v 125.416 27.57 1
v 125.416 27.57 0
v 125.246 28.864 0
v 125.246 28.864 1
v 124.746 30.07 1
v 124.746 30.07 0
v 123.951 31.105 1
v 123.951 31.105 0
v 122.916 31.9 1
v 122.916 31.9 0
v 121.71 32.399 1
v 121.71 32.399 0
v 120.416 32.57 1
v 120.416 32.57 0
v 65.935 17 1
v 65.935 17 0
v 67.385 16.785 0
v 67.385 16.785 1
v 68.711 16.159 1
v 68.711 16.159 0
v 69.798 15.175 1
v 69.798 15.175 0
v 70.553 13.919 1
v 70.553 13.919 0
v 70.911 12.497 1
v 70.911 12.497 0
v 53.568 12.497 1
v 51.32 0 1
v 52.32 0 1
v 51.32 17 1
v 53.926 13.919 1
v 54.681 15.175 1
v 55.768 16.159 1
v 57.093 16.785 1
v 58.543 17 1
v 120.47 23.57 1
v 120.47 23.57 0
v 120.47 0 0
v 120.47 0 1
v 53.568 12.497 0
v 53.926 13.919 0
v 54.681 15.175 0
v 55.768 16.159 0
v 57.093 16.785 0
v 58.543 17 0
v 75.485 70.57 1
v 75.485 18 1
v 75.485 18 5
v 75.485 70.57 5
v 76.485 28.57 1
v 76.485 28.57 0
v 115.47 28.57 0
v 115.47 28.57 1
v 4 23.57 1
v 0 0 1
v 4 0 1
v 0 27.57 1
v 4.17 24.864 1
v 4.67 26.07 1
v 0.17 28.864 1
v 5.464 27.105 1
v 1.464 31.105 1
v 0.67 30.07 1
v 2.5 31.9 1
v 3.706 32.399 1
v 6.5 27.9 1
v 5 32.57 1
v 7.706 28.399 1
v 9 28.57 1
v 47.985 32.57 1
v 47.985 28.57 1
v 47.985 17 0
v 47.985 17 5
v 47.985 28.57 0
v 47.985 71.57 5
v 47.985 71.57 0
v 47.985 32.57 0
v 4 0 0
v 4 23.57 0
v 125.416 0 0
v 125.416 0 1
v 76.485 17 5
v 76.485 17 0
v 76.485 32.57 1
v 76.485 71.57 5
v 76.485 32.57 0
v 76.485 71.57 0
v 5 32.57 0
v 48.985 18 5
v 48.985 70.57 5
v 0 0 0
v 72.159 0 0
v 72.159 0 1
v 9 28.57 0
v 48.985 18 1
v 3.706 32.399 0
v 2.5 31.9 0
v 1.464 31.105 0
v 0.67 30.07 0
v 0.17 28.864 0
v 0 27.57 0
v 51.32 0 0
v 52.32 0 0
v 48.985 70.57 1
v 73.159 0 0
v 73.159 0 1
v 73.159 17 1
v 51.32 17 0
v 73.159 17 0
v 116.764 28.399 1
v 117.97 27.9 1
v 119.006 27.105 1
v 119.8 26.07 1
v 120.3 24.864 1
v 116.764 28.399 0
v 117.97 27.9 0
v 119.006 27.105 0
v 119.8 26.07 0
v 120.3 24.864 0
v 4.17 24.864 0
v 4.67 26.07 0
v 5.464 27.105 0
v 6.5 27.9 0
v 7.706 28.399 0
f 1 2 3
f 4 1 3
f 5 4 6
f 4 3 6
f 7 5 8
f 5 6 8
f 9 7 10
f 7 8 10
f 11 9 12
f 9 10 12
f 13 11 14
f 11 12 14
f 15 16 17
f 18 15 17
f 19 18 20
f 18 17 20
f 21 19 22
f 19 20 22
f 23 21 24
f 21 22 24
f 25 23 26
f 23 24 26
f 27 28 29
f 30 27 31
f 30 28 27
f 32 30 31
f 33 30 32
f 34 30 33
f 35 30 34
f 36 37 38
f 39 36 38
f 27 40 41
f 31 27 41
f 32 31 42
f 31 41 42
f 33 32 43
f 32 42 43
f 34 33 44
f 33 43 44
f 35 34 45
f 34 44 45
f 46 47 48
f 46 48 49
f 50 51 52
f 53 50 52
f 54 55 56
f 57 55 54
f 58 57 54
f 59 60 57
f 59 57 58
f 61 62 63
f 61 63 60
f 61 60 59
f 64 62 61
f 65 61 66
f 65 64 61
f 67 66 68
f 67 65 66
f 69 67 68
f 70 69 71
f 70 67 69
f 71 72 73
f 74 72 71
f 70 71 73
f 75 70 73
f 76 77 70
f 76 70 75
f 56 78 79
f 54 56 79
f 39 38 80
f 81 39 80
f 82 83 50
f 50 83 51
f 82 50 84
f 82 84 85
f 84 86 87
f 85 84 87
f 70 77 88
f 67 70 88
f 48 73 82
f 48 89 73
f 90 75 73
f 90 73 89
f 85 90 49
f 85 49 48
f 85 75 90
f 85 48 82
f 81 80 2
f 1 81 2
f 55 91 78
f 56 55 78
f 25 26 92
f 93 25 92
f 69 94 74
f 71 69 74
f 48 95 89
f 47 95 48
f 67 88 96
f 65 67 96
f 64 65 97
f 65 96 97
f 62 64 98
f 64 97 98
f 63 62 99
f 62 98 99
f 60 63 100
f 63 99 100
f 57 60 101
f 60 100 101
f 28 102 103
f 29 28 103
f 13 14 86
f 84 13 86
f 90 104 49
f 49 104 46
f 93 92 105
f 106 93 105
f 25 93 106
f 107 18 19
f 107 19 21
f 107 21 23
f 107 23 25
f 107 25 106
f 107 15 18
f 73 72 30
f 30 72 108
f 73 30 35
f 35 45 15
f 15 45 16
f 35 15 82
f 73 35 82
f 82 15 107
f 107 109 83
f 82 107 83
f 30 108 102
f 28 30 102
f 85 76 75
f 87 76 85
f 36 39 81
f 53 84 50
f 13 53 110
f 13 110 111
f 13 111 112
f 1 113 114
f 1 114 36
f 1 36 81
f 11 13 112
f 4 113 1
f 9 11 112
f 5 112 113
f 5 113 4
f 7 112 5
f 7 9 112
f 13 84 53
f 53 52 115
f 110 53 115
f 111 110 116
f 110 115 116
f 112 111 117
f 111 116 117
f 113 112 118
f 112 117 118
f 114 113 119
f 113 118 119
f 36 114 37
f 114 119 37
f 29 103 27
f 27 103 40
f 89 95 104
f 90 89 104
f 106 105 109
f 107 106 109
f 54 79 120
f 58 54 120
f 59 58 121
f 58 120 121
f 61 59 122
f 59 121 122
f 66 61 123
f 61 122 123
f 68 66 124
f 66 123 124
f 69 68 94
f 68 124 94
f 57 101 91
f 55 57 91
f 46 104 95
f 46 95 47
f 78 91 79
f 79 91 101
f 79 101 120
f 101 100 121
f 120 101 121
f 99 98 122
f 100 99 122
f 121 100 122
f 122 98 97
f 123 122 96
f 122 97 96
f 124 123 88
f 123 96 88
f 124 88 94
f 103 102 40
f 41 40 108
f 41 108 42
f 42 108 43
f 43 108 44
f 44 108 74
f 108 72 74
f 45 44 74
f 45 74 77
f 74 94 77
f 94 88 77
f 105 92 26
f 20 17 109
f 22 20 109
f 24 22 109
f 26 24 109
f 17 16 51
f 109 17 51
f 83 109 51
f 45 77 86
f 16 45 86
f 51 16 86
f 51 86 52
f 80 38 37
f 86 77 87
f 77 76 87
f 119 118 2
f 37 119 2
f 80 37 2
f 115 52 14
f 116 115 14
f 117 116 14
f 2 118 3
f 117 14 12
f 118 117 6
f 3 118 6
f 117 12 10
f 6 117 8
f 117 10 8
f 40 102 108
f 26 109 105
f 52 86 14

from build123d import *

# Parameters (mm, degrees)
BOSS_EXTRU_1_DEPTH = 1
ESQUISSE2_W        = 28.5
ESQUISSE2_H        = 54.569597512
ESQUISSE2_W_2      = 26.5
ESQUISSE2_H_2      = 52.569597512
BOSS_EXTRU_2_DEPTH = 4


with BuildPart() as part:
    # Esquisse1 → Boss.-Extru.1 (new body)
    with BuildSketch(Plane.XY):
        with BuildLine():
            Line((0, 27.569597512), (0, 0))
            Line((0, 0), (4, 0))
            Line((4, 0), (4, 23.569597512))
            ThreePointArc((4, 23.569597512), (5.464466094, 27.105131417), (9, 28.569597512))
            Line((9, 28.569597512), (47.9850382, 28.569597512))
            Line((47.9850382, 28.569597512), (47.9850382, 17))
            Line((47.9850382, 17), (51.319537583, 17))
            Line((51.319537583, 17), (51.319537583, 0))
            Line((51.319537583, 0), (52.319537583, 0))
            Line((52.319537583, 0), (53.567879902, 12.496984059))
            ThreePointArc((53.567879902, 12.496984059), (55.187893525, 15.707082431), (58.543119277, 17))
            Line((58.543119277, 17), (65.935302341, 17))
            ThreePointArc((65.935302341, 17), (69.290528094, 15.707082431), (70.910541717, 12.496984059))
            Line((70.910541717, 12.496984059), (72.158884036, 0))
            Line((72.158884036, 0), (73.158884036, 0))
            Line((73.158884036, 0), (73.158884036, 17))
            Line((73.158884036, 17), (76.4850382, 17))
            Line((76.4850382, 17), (76.4850382, 28.569597512))
            Line((76.4850382, 28.569597512), (115.4700764, 28.569597512))
            ThreePointArc((115.4700764, 28.569597512), (119.005610306, 27.105131417), (120.4700764, 23.569597512))
            Line((120.4700764, 23.569597512), (120.4700764, 0))
            Line((120.4700764, 0), (125.415873255, 0))
            Line((125.415873255, 0), (125.415873255, 27.569597512))
            ThreePointArc((125.415873255, 27.569597512), (123.951407161, 31.105131417), (120.415873255, 32.569597512))
            Line((120.415873255, 32.569597512), (76.4850382, 32.569597512))
            Line((76.4850382, 32.569597512), (76.4850382, 71.569597512))
            Line((76.4850382, 71.569597512), (47.9850382, 71.569597512))
            Line((47.9850382, 71.569597512), (47.9850382, 32.569597512))
            Line((47.9850382, 32.569597512), (5, 32.569597512))
            ThreePointArc((5, 32.569597512), (1.464466094, 31.105131417), (0, 27.569597512))
        make_face()
    extrude(amount=BOSS_EXTRU_1_DEPTH)

    # Esquisse2 → Boss.-Extru.2 (add)
    with BuildSketch(Plane.XY.offset(1)):
        with Locations((62.2350382, 44.284798756)):
            Rectangle(ESQUISSE2_W, ESQUISSE2_H)
        with Locations((62.2350382, 44.284798756)):
            Rectangle(ESQUISSE2_W_2, ESQUISSE2_H_2, mode=Mode.SUBTRACT)
    extrude(amount=BOSS_EXTRU_2_DEPTH)


solid = part.part
